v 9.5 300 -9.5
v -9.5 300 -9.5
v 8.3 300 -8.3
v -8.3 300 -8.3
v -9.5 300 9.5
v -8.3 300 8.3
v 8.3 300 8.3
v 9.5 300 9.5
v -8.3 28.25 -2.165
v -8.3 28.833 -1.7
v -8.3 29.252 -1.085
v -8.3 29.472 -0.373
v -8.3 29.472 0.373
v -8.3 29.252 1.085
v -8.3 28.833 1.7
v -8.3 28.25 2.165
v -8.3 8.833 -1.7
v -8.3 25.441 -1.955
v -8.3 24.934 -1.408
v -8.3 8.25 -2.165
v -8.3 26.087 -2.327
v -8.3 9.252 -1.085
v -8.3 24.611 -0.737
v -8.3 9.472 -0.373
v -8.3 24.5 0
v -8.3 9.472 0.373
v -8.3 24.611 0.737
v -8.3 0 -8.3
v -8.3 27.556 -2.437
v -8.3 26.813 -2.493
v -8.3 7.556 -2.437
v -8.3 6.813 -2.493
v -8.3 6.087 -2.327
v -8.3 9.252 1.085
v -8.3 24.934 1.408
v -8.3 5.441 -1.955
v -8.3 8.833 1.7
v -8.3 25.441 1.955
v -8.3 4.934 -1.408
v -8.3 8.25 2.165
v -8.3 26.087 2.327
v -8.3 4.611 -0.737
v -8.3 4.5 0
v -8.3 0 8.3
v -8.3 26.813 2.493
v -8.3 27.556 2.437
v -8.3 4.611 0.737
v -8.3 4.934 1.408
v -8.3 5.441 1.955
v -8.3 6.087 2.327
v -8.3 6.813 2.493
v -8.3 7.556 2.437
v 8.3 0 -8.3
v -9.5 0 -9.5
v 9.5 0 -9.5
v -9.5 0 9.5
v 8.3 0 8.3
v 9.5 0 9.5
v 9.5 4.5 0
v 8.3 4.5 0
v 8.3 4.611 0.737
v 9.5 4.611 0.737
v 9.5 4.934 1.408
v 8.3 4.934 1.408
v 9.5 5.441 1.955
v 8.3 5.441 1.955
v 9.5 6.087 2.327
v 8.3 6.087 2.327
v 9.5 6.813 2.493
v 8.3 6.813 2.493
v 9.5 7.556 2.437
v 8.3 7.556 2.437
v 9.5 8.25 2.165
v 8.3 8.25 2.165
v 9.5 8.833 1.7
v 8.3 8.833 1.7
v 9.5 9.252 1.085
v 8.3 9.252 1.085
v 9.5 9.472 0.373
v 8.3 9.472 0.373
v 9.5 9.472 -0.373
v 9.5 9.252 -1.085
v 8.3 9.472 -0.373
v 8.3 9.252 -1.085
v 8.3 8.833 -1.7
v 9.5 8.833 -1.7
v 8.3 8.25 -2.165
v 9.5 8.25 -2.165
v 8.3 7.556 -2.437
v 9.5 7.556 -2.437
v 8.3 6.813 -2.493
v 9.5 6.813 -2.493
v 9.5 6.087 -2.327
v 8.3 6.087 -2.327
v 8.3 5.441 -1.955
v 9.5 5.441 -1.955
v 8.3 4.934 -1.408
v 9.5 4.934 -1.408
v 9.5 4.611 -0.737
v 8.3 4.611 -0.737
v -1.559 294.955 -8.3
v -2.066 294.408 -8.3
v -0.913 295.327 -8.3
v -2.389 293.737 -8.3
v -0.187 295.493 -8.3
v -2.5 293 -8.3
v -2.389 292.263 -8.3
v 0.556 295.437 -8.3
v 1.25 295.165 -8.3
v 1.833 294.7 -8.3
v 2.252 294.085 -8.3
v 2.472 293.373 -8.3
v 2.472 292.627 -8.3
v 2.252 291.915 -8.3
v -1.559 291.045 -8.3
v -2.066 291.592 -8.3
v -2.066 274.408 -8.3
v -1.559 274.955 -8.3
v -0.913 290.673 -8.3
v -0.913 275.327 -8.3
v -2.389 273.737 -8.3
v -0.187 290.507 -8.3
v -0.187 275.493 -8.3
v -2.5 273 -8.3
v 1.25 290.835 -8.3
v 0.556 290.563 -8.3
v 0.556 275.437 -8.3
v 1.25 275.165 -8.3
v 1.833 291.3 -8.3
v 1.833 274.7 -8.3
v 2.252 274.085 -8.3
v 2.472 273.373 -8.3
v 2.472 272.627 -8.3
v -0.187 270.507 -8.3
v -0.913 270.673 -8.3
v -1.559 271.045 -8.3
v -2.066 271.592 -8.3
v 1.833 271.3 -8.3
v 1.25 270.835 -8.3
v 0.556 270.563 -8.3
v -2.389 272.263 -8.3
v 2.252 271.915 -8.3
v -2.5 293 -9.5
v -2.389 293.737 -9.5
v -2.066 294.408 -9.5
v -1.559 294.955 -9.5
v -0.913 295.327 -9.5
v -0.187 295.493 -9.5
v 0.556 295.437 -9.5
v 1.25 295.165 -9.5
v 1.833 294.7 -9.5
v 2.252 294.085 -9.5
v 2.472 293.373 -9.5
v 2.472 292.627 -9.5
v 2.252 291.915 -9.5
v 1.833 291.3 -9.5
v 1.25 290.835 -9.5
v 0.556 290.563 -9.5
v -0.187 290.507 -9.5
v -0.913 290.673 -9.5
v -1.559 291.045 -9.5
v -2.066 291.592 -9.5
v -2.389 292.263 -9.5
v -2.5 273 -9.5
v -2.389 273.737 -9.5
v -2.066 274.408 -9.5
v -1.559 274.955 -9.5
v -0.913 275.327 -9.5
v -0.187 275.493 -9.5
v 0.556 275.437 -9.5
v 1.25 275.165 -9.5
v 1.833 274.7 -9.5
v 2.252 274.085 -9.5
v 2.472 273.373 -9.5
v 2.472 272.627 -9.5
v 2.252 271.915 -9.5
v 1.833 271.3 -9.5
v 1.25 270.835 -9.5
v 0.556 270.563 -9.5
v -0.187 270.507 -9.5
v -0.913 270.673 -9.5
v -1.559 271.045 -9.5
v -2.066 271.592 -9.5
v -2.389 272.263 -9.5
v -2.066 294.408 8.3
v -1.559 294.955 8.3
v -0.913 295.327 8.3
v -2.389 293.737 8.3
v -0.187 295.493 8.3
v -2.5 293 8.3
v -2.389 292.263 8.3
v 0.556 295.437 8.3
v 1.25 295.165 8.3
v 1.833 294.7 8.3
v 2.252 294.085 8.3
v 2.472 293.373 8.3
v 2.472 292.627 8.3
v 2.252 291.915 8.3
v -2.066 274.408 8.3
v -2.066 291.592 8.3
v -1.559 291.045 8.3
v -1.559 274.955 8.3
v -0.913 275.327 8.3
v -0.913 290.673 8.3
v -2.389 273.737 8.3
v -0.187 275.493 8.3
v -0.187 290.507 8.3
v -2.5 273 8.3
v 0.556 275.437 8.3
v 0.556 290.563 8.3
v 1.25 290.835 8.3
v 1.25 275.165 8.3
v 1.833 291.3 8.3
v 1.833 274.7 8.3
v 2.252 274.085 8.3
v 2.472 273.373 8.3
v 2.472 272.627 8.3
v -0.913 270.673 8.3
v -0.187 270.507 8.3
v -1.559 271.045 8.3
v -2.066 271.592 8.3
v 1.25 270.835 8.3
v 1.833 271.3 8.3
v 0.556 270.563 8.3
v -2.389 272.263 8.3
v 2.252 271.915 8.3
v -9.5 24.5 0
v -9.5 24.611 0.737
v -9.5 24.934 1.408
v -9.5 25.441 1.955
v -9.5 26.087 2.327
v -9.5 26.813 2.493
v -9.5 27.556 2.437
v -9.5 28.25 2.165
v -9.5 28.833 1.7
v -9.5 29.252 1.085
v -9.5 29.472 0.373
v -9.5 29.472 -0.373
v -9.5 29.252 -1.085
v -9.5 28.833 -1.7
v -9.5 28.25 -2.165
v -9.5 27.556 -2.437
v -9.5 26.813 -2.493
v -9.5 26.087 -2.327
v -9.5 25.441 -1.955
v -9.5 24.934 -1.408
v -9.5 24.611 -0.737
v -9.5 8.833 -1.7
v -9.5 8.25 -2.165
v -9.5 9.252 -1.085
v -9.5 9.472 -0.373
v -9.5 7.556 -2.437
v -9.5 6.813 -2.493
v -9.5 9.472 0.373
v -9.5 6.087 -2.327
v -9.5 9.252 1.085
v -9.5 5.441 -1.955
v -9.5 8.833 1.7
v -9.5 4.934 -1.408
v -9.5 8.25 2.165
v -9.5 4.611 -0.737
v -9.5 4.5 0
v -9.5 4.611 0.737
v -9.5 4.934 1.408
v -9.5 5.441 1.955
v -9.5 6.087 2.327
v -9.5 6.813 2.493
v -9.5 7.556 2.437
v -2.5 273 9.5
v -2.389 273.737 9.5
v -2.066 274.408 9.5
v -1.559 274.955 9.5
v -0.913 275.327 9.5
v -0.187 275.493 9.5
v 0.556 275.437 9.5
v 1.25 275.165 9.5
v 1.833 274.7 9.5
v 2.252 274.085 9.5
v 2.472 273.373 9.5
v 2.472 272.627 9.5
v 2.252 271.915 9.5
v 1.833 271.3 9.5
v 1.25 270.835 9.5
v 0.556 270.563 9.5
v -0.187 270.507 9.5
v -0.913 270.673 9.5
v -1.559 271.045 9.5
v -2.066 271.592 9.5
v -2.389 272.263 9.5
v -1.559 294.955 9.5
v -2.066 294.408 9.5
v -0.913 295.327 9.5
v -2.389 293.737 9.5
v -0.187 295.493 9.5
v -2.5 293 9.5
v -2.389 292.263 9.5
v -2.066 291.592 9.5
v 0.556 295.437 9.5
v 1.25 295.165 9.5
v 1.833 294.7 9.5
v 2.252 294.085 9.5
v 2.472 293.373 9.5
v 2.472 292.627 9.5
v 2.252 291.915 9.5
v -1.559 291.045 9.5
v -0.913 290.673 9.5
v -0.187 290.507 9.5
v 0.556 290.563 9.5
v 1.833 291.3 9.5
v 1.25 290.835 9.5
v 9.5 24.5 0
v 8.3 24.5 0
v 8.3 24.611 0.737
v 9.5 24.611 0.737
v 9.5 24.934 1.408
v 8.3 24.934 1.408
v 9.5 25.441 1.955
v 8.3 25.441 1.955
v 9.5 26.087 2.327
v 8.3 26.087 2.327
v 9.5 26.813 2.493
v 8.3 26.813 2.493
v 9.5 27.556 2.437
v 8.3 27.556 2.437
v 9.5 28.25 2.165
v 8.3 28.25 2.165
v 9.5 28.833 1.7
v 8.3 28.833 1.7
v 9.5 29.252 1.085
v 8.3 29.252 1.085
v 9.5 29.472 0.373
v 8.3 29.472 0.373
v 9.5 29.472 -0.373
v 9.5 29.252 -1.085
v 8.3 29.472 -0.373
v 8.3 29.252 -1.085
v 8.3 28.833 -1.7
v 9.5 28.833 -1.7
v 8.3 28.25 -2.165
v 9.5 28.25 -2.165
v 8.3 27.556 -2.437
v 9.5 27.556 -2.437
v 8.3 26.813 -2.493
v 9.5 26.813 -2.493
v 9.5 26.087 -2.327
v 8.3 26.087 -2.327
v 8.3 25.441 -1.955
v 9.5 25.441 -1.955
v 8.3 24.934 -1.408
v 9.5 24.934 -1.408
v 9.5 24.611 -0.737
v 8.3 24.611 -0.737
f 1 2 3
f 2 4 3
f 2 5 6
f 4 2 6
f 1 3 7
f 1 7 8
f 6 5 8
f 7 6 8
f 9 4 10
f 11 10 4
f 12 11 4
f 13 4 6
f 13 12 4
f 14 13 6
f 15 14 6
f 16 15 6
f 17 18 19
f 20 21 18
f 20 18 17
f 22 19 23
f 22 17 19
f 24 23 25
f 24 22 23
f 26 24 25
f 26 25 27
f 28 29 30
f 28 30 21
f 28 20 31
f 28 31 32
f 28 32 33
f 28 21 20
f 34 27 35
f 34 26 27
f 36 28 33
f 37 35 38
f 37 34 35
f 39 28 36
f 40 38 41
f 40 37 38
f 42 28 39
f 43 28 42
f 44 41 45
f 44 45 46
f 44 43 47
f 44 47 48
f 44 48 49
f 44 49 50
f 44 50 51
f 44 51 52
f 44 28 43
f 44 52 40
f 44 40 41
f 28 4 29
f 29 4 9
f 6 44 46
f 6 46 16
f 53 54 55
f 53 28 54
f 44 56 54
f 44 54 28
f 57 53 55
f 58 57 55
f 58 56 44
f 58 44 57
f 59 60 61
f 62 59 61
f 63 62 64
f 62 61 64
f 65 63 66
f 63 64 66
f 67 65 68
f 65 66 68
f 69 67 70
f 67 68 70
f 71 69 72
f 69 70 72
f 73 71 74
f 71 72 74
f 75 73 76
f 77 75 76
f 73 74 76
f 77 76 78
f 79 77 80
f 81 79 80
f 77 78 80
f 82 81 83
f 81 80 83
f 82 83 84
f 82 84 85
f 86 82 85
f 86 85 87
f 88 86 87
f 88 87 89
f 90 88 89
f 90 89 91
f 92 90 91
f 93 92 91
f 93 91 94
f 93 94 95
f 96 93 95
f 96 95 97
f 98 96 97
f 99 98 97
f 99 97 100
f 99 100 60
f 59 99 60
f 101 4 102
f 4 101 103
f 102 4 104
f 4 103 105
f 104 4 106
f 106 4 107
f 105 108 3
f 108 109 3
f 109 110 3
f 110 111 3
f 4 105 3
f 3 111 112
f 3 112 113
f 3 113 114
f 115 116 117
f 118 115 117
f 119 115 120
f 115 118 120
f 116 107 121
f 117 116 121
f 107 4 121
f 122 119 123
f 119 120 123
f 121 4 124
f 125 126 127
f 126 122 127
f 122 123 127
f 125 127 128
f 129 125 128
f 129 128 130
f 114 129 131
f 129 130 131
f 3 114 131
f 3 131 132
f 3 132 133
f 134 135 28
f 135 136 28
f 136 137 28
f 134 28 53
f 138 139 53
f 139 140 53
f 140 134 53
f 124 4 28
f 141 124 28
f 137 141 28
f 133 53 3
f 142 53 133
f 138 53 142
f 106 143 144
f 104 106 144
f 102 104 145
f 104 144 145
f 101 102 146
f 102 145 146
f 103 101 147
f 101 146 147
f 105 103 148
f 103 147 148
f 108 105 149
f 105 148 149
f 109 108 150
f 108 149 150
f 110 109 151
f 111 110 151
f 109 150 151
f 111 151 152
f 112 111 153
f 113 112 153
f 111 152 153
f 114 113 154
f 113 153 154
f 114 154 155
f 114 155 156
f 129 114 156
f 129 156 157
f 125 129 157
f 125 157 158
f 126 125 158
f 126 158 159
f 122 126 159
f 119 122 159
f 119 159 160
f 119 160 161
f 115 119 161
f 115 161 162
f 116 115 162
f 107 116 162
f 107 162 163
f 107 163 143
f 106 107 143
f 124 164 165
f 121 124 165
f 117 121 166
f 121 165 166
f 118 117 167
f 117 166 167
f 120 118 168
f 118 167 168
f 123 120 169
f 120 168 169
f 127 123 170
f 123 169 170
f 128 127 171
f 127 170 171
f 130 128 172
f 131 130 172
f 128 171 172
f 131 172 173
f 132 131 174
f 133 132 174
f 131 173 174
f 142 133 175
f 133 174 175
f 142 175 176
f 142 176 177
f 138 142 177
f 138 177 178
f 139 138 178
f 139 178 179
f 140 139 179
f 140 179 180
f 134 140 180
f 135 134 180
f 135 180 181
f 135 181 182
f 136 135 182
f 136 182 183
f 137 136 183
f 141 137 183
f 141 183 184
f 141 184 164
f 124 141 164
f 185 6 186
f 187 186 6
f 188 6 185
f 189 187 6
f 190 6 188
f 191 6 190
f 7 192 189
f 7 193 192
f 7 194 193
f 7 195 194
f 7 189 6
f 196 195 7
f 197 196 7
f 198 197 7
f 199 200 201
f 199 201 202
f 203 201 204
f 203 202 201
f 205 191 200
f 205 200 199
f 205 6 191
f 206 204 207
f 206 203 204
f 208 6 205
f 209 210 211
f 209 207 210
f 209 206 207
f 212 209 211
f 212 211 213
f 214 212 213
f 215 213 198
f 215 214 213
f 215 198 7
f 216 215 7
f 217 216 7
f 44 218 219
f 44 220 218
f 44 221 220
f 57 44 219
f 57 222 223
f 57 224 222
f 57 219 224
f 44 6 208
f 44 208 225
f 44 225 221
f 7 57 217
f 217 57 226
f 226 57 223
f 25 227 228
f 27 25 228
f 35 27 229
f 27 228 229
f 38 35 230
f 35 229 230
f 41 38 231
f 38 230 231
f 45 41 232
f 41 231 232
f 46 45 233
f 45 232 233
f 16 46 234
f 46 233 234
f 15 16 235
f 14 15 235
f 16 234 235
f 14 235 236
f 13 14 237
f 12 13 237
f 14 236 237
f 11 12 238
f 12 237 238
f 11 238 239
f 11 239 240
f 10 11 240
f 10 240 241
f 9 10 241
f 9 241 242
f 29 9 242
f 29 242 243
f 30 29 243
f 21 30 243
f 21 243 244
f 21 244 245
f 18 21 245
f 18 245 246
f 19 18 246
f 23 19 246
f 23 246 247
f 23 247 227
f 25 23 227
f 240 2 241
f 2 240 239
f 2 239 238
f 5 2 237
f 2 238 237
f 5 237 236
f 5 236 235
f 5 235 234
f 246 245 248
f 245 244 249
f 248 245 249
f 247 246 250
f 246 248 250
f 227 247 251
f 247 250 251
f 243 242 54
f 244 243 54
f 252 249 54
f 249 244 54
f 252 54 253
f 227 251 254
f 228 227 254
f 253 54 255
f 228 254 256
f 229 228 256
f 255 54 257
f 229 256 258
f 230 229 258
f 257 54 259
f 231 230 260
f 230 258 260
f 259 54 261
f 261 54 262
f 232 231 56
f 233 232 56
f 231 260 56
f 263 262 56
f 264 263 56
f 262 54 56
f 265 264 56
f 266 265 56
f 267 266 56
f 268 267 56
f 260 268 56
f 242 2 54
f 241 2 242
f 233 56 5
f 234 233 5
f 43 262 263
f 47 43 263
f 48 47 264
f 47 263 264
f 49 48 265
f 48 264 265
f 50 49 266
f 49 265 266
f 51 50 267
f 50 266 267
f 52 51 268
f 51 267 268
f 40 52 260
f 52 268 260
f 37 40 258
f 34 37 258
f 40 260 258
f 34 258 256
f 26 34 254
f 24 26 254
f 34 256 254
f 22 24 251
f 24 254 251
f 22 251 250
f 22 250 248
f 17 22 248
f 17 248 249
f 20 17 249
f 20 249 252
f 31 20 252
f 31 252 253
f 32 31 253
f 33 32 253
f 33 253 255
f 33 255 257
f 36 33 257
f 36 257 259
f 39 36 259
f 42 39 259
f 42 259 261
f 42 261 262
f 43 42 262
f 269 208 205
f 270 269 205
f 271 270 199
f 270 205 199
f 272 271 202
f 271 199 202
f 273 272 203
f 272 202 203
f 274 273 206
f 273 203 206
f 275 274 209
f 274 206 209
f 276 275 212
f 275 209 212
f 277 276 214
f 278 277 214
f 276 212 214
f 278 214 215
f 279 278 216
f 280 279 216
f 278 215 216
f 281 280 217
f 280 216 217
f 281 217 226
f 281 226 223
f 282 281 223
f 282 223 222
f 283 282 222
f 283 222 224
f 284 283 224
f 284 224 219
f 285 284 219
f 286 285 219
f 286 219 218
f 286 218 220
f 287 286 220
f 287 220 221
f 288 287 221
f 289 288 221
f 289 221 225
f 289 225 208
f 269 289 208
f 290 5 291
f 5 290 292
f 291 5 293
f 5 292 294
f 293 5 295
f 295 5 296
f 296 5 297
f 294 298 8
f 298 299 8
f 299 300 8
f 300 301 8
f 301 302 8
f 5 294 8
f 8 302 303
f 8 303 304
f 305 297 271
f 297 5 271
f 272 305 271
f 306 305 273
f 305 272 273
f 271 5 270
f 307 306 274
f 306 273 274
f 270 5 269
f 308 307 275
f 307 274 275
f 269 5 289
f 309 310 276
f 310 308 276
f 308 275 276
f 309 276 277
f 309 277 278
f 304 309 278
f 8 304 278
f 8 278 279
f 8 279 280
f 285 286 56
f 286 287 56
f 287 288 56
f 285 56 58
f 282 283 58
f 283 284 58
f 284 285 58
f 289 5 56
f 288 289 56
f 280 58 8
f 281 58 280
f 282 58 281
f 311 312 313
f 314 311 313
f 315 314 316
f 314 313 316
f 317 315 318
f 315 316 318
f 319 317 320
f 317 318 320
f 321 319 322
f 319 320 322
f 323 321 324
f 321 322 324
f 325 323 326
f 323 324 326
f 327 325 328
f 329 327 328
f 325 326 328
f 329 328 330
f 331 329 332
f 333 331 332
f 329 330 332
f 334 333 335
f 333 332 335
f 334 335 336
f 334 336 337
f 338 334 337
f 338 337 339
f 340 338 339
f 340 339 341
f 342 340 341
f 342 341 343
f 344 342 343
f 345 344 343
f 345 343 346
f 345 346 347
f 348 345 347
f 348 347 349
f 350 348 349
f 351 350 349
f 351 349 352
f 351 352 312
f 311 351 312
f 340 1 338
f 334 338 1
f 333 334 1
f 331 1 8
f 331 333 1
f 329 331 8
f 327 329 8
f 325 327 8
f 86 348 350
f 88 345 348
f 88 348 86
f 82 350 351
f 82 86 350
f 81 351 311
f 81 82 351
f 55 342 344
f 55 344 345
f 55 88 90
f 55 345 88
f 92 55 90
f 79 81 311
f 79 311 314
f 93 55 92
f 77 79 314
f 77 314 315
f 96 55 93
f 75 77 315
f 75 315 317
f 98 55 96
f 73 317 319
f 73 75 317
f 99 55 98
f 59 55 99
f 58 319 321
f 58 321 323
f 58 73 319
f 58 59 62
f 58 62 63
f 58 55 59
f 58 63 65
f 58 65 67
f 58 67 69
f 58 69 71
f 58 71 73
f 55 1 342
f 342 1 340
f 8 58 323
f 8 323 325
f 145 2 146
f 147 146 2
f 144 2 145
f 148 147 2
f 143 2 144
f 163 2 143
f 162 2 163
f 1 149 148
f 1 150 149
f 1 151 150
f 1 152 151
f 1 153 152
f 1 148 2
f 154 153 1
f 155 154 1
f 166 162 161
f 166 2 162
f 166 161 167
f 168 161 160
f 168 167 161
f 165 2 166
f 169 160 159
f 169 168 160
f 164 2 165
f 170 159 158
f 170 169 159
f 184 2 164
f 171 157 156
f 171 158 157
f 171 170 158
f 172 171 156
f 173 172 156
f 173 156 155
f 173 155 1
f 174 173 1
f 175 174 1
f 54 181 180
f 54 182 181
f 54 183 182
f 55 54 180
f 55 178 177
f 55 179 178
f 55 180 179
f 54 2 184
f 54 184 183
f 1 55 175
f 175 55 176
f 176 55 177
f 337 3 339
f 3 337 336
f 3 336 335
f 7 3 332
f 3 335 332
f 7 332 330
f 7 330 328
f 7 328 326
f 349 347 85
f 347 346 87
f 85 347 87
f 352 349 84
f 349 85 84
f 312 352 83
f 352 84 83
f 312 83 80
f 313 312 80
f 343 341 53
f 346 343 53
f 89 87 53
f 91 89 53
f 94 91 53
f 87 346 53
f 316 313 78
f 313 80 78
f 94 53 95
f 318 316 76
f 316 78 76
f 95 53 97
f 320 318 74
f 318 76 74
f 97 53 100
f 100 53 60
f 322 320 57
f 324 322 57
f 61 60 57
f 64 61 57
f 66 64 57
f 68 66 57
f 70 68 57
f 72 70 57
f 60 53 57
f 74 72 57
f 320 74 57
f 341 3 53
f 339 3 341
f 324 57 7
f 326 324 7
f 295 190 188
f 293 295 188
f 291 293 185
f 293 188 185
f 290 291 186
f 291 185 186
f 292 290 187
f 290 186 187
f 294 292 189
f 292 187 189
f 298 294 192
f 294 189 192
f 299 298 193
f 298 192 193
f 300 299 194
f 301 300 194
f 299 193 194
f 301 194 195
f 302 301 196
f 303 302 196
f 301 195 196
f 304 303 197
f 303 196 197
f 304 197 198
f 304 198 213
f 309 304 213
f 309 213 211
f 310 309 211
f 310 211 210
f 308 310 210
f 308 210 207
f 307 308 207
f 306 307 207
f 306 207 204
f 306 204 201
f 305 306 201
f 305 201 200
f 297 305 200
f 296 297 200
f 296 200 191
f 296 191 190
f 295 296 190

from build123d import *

# Parameters (mm, degrees)
F1_W       = 19
F1_H       = 19
F1_W_2     = 16.6
F1_H_2     = 16.6
F2_DEPTH   = 300
F5_D       = 5
F5_ON_F4_D = 5


# Not quite as in the source:
# - a feature names something its author has since deleted; it is built from what else it names


with BuildPart() as f2:
    # F1 (on Front) → F2 (new body)
    with BuildSketch(Plane.XZ):
        Rectangle(F1_W, F1_H)
        Rectangle(F1_W_2, F1_H_2, mode=Mode.SUBTRACT)
    extrude(amount=-F2_DEPTH)

    # F5 (through all)
    with Locations(Plane.YZ.offset(9.5)):
        with Locations((7, 0), (27, 0)):
            Hole(F5_D / 2)

    # F5 on F4 (through all)
    with Locations(Plane.XY.offset(9.5)):
        with Locations((0, 273), (0, 293)):
            Hole(F5_ON_F4_D / 2)


solid = f2.part
